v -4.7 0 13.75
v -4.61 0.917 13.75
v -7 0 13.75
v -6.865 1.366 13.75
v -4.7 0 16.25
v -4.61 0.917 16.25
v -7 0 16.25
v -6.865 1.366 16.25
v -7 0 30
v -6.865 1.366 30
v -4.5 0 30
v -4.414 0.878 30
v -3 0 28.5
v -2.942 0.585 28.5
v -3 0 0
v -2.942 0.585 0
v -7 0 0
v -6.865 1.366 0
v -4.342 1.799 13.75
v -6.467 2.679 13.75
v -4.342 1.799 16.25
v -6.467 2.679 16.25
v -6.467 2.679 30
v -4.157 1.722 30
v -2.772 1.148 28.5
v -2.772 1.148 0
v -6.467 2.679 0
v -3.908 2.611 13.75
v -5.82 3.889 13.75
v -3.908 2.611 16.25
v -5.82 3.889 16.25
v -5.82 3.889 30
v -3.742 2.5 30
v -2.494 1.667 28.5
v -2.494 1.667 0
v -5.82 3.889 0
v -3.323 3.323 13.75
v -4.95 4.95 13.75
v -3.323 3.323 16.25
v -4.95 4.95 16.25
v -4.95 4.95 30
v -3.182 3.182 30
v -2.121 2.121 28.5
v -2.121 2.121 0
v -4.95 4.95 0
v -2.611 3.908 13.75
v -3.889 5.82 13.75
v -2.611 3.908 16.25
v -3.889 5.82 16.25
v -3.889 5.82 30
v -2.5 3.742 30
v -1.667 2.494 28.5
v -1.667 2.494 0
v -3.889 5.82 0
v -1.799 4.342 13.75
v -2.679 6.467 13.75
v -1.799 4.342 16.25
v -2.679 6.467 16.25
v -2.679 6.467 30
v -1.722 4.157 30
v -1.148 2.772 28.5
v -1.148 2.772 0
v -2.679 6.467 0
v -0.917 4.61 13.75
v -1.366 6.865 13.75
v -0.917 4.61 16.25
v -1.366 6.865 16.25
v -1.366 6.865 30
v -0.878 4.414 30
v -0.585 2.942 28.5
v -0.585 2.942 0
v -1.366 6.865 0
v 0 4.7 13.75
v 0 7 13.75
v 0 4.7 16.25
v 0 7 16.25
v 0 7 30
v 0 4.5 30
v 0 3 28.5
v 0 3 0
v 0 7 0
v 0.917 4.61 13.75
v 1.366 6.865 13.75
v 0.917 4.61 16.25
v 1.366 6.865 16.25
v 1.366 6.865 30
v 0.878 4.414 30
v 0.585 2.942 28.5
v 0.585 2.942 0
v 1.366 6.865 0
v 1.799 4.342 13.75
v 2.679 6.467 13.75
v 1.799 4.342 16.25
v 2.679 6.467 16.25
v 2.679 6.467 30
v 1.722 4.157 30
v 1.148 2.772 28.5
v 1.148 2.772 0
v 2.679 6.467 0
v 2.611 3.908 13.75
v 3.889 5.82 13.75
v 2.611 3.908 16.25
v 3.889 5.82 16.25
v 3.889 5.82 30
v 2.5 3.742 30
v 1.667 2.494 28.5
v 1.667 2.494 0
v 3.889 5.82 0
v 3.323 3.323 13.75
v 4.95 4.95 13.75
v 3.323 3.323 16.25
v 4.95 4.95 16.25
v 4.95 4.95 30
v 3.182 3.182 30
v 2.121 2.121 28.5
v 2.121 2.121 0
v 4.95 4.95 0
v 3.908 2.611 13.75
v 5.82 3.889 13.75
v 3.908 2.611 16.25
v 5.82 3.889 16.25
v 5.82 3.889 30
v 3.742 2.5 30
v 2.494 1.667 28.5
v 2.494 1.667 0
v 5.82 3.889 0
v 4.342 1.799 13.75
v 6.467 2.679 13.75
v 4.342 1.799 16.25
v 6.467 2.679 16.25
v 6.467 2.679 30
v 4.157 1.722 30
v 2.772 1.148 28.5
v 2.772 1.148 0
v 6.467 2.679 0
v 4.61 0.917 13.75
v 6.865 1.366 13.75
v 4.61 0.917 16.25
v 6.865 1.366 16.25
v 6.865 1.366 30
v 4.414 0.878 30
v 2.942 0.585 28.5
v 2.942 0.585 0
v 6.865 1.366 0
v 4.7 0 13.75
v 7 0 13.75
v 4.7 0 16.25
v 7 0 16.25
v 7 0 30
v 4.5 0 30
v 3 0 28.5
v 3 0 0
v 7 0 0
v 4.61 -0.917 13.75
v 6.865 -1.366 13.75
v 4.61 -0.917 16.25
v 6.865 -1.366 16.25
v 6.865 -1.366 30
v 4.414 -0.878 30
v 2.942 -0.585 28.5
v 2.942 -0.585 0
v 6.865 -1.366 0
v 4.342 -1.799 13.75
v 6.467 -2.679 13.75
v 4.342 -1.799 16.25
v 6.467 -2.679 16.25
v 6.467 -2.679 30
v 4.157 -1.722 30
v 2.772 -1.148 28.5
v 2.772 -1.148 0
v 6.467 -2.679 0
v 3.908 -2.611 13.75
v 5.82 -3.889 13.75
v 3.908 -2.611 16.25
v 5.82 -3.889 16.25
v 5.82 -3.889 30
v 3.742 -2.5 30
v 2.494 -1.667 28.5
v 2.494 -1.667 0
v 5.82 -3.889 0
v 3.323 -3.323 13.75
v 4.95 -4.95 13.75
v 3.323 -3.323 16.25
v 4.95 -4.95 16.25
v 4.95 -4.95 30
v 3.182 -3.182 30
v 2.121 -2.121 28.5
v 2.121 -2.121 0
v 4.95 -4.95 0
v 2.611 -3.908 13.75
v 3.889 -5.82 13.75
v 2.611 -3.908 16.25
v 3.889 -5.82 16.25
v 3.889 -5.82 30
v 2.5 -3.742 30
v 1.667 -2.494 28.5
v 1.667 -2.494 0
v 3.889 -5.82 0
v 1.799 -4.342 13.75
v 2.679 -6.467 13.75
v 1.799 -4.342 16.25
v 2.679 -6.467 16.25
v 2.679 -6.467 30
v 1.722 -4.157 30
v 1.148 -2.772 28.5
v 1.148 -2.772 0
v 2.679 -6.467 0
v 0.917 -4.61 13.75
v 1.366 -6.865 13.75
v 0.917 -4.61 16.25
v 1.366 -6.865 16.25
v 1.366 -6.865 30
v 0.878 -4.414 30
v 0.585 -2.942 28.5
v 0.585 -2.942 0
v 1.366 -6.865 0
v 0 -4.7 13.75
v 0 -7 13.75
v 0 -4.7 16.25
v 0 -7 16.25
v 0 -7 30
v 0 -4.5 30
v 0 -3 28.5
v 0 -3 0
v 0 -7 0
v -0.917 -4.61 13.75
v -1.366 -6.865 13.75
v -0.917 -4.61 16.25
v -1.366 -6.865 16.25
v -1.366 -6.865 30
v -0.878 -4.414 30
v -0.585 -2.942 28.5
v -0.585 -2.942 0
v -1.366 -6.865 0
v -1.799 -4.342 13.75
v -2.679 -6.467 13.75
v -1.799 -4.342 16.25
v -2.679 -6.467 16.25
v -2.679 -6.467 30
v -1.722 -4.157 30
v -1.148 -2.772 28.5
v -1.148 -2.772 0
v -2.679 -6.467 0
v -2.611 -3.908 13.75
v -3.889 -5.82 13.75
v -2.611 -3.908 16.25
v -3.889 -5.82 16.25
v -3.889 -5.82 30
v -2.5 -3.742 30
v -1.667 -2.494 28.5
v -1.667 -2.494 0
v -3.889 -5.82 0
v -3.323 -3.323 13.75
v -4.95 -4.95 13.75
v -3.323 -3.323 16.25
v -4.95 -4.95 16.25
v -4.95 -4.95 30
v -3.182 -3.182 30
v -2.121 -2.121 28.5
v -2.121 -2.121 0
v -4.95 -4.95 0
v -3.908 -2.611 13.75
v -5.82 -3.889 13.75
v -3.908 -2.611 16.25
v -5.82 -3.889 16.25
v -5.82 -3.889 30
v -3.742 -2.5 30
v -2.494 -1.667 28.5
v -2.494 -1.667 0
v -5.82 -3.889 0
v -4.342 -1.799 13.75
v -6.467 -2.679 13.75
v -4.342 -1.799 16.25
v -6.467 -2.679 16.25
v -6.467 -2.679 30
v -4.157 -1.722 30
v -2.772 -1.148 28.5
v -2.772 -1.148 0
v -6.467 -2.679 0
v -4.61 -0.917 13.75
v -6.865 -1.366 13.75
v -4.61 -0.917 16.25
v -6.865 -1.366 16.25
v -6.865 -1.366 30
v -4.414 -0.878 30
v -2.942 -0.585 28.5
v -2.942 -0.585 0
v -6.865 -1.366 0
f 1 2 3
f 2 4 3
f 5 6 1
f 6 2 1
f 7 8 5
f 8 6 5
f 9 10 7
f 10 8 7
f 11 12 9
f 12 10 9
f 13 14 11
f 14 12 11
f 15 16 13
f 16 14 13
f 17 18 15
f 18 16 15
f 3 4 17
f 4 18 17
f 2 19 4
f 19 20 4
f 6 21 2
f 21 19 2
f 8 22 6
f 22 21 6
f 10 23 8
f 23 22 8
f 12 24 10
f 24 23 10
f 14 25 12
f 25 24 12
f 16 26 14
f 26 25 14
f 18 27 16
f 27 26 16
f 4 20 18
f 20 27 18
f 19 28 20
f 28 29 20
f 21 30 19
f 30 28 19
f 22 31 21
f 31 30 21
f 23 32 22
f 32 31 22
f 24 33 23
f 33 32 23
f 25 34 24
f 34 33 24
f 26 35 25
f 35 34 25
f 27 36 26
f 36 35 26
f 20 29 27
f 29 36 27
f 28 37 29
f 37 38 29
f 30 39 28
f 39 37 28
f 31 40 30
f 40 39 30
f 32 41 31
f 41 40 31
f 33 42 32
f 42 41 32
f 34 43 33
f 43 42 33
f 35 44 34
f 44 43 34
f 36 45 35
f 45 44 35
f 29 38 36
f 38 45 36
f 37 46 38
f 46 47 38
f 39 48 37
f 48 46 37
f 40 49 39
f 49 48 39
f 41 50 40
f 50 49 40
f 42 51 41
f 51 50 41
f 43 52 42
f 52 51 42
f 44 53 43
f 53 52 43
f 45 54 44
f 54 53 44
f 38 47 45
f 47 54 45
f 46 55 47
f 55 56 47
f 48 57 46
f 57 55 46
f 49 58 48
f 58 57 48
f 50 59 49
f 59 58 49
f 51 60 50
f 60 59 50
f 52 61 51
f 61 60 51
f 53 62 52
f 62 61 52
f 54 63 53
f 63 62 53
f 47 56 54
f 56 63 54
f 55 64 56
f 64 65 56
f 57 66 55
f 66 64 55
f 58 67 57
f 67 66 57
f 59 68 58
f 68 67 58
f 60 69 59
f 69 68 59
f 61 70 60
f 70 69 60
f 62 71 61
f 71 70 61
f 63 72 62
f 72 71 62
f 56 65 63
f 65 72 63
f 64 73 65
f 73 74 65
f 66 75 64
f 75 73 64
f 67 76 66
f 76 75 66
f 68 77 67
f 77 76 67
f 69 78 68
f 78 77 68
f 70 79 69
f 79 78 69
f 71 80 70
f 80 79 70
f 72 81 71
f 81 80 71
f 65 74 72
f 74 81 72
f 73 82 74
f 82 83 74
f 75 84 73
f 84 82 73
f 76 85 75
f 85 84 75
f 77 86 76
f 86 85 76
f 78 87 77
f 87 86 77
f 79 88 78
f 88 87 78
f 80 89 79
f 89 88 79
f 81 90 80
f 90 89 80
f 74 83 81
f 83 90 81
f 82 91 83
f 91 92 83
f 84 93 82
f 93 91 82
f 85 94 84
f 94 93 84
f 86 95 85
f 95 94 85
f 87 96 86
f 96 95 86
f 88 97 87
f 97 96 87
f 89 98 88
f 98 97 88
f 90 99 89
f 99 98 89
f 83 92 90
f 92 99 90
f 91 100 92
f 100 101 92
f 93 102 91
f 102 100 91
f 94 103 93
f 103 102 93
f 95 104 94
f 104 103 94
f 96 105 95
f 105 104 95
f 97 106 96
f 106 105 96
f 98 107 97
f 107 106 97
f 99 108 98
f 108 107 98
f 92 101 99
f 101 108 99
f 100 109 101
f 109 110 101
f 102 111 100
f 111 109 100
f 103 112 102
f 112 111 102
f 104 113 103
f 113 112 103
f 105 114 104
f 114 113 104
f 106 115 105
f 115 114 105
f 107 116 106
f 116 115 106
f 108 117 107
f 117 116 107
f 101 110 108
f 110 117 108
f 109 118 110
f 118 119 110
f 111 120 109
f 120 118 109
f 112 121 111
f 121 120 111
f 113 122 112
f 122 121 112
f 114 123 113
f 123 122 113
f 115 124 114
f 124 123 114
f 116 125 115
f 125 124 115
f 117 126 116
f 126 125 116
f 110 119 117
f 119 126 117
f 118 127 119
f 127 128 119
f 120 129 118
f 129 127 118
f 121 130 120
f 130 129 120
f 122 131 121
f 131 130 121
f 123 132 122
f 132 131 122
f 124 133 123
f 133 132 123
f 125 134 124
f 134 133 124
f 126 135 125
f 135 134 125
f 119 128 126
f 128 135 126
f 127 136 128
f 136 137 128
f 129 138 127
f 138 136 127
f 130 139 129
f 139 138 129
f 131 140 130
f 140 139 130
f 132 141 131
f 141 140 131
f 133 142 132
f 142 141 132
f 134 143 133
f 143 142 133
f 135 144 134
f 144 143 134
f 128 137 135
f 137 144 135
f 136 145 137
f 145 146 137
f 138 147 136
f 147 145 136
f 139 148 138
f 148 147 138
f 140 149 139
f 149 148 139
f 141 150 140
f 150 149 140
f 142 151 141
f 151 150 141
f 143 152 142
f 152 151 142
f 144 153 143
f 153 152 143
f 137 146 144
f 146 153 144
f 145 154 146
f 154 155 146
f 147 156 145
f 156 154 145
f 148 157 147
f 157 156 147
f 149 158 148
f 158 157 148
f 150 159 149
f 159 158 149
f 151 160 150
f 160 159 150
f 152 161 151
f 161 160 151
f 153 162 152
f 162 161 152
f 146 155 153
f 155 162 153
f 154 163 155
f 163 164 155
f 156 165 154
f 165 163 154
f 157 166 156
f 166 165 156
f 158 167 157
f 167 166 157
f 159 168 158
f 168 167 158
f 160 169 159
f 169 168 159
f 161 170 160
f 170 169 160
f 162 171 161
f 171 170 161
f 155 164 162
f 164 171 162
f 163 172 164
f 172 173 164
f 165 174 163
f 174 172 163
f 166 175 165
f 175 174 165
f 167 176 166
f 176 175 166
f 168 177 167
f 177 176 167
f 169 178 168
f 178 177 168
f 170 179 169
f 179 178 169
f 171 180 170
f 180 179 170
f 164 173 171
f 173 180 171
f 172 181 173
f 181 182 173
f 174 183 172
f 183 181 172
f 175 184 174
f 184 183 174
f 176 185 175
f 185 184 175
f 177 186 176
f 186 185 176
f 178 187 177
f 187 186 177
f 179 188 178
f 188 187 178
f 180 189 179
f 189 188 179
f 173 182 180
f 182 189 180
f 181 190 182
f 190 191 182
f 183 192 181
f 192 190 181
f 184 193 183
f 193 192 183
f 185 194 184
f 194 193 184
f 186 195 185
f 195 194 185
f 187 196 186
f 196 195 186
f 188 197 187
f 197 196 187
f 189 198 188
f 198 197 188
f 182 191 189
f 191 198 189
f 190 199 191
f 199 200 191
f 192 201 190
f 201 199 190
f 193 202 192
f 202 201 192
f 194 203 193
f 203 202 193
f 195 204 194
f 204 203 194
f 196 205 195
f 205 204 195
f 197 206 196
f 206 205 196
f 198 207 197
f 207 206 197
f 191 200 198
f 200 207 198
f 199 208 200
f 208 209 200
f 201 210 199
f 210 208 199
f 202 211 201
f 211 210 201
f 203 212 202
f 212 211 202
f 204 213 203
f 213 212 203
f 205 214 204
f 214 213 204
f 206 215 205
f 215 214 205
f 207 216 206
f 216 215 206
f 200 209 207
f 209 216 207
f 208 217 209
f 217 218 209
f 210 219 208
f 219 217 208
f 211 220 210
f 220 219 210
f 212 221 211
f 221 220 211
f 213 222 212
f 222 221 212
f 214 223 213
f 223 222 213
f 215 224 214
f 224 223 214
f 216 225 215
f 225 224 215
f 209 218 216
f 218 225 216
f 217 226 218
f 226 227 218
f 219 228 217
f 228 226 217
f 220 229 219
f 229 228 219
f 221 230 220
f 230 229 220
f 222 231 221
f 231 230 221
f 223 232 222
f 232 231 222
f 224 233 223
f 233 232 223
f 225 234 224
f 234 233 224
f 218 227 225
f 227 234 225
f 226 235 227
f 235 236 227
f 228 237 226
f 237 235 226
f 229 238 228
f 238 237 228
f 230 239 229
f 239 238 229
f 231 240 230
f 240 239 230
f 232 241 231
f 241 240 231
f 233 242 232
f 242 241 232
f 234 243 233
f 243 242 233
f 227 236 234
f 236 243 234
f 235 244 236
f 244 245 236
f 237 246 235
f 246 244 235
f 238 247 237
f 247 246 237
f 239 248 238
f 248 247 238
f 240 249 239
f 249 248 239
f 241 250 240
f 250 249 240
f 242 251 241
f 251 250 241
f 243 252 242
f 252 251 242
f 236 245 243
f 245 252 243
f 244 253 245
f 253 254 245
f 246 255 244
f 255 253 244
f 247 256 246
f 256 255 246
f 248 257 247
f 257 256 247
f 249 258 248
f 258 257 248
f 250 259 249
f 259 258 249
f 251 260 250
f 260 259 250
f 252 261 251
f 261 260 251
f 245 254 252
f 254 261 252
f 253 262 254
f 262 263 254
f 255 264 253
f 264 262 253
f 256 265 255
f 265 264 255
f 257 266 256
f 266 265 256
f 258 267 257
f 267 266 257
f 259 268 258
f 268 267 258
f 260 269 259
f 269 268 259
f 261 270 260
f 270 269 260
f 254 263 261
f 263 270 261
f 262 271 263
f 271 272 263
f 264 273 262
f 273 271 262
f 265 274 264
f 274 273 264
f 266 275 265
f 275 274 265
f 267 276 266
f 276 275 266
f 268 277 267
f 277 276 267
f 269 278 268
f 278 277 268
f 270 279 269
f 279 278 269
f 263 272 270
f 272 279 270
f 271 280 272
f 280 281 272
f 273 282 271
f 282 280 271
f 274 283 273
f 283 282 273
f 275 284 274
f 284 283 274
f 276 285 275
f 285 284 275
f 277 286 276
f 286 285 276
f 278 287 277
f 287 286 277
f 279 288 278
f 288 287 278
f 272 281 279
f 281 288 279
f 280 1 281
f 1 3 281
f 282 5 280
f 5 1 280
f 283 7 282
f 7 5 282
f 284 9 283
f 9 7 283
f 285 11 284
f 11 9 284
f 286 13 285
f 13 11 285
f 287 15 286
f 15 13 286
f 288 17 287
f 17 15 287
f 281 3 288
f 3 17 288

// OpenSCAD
$fn = 32;

// ----------------------------------------------------------------------
// Grooved revolve: thread_relief, bore R3
// ----------------------------------------------------------------------

// --- parameters (mm) ---
bore_r = 3;               // bore radius
outer_r = 7;              // outer radius of the body
total_h = 30;             // overall height, Z
wall = 4;                 // radial wall thickness
groove_w = 2.5;           // groove width
groove_d = 2.3;           // groove depth
grooves = 1;              // number of outer grooves
relief = 1.5;             // thread relief leg at the bore mouth
relief_angle = 45;        // thread relief chamfer angle, degrees

bbox_x = 2 * outer_r;  // full diameter
bore_d = 2 * bore_r;  // bore diameter
body_d = 2 * outer_r;  // body diameter
revolve_angle = 360;  // full turn around the Z axis

profile = [[3, 0], [7, 0], [7, 13.75], [4.7, 13.75], [4.7, 16.25], [7, 16.25], [7, 30], [4.5, 30], [3, 28.5]];  // primary outline, 9 points, counter clockwise

// --- the one profile operation ---
rotate_extrude(angle = revolve_angle) polygon(points = profile);
